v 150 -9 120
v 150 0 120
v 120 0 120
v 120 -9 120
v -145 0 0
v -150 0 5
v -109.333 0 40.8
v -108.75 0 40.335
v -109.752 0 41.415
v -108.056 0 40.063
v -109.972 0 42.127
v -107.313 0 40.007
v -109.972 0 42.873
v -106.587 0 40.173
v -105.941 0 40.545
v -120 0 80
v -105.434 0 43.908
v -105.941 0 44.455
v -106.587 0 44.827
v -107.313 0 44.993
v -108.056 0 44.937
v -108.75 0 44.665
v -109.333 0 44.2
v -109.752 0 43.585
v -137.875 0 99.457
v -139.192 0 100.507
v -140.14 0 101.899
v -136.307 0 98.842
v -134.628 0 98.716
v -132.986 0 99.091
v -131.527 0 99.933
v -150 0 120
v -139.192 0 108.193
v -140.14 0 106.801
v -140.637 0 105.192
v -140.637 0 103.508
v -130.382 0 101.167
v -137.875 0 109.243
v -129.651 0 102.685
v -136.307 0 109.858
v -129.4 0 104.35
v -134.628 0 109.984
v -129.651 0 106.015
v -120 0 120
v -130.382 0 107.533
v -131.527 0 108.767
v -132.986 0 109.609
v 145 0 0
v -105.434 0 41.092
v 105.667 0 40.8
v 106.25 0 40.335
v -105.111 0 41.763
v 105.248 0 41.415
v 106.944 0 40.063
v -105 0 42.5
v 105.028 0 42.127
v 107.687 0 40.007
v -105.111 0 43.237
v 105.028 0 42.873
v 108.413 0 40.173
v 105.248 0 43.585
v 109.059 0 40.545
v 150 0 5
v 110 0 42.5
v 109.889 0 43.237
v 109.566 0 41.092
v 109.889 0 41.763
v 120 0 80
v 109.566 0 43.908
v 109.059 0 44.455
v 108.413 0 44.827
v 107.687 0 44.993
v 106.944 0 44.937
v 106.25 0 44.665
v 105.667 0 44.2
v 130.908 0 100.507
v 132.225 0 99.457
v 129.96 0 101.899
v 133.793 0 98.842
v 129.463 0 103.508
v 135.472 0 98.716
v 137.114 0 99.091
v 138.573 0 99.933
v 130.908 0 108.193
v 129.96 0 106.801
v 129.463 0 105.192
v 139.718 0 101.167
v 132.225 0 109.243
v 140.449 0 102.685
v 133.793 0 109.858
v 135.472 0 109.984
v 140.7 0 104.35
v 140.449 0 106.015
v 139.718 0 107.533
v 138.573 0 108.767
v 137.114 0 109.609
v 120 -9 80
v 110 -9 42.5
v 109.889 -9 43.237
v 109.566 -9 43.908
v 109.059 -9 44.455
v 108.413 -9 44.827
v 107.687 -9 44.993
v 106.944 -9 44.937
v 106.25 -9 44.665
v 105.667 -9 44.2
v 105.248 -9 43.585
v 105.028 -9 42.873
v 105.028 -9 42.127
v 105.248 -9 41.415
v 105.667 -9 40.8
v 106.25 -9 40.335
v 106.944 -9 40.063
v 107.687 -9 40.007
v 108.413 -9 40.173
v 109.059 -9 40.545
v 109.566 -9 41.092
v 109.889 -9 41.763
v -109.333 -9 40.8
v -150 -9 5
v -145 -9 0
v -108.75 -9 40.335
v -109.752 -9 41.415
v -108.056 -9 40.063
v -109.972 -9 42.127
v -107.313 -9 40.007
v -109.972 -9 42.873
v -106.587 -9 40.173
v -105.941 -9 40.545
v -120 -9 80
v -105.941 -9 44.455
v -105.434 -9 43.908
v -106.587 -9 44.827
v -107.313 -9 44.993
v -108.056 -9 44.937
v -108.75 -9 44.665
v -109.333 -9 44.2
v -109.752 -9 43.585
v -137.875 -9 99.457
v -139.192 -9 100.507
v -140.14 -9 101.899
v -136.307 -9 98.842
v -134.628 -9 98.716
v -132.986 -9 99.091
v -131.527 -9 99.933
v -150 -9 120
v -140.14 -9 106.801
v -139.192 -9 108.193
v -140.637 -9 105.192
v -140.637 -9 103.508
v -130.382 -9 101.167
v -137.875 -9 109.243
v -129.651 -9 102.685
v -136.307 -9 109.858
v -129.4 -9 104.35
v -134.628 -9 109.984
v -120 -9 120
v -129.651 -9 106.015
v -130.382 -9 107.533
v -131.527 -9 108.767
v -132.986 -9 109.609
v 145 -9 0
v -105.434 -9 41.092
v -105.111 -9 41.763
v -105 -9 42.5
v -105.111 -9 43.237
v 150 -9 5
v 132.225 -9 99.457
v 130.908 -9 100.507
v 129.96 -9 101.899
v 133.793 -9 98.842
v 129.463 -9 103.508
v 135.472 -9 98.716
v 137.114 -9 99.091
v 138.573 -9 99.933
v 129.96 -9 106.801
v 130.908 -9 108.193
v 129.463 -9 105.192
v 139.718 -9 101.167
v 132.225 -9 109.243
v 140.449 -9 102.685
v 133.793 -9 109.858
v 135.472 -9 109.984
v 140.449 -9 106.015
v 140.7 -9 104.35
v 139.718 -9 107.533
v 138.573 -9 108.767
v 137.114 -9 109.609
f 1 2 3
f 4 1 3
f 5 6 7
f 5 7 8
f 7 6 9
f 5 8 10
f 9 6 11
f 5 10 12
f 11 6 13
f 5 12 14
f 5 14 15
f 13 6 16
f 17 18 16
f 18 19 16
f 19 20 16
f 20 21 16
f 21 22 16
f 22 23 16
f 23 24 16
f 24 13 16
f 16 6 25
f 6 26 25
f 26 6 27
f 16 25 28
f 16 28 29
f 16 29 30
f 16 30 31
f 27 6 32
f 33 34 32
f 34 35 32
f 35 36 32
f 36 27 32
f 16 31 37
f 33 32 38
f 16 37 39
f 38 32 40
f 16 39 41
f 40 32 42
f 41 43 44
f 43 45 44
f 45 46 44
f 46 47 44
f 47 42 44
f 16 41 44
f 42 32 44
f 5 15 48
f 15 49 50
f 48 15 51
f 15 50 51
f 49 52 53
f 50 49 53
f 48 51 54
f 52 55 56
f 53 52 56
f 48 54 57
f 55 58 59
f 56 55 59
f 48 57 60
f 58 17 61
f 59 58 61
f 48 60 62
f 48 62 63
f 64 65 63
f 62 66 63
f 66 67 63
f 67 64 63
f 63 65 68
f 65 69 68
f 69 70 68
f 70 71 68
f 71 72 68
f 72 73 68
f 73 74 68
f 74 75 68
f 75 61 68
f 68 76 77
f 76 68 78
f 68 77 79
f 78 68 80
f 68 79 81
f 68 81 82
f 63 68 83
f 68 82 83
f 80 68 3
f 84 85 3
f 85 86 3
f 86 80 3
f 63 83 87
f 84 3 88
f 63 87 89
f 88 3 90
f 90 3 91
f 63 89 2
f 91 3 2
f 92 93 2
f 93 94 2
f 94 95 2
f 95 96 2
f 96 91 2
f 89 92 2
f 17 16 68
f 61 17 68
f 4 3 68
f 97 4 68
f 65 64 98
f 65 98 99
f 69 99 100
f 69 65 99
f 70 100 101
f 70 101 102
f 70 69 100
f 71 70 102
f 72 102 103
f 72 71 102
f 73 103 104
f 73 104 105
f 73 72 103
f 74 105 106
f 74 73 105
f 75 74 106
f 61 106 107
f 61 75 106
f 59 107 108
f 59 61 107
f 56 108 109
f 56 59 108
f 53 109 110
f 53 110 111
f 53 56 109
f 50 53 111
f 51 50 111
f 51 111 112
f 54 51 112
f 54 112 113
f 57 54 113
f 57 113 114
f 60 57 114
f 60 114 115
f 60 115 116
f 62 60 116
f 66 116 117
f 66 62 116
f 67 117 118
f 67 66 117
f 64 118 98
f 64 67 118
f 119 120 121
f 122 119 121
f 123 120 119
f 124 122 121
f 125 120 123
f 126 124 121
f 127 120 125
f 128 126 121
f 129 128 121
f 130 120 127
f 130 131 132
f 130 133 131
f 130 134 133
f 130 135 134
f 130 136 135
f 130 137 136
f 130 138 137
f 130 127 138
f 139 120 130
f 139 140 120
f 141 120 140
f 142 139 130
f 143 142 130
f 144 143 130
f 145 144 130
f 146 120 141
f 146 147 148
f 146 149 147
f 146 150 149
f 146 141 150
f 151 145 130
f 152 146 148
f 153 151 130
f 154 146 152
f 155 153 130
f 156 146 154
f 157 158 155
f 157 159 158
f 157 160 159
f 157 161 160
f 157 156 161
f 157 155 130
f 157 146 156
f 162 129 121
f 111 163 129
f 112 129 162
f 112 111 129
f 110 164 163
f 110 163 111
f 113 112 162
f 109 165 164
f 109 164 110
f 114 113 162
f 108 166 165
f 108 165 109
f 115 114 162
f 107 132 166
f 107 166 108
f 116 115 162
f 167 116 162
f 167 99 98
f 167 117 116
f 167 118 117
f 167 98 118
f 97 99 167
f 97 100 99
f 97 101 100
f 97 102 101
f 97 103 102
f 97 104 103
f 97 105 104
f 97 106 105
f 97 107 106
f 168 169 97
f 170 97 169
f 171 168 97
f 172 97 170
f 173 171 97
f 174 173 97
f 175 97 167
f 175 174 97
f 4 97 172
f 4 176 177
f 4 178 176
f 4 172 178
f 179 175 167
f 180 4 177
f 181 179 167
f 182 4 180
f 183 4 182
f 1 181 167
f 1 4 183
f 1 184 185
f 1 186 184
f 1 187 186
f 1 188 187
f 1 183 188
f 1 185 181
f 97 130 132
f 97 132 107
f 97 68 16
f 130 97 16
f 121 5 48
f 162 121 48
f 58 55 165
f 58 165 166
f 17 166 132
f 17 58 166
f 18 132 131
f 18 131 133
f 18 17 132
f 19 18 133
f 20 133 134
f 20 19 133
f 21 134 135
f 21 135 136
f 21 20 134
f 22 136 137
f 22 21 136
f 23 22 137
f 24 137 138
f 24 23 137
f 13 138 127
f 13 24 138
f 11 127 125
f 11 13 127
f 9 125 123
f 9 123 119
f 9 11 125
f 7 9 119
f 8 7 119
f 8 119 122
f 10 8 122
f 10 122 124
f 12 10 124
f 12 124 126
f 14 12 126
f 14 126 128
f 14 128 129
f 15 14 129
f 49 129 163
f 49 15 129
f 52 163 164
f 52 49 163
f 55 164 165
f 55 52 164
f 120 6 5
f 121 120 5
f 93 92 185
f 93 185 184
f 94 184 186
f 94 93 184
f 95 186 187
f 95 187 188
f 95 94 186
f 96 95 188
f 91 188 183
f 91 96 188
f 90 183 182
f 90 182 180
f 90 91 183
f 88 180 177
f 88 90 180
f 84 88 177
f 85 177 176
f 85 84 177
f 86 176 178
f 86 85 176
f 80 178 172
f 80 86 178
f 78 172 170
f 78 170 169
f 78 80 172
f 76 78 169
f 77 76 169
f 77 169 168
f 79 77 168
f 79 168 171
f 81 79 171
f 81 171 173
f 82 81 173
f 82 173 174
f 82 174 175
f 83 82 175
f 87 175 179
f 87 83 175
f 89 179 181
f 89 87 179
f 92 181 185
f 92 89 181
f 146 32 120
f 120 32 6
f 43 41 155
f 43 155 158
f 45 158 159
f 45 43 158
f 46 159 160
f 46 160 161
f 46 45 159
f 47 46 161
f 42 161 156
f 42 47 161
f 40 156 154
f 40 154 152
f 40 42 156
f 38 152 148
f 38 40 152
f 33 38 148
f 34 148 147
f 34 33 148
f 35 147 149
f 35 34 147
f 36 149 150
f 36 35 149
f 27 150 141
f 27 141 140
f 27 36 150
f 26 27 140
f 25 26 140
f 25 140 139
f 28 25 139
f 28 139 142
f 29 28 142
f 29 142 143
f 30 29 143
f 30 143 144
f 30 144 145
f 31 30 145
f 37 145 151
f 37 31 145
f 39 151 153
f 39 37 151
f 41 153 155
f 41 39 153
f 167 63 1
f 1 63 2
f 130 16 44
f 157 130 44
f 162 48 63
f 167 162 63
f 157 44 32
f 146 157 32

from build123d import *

# Parameters (mm, degrees)
F0_R     = 2.5
F0_R_2   = 5.65
F1_DEPTH = 9


with BuildPart() as f1:
    # F0 (on Front) → F1 (new body)
    with BuildSketch(Plane.XZ):
        Polygon((-120, 120), (-150, 120), (-150, 5), (-145, 0), (0, 0), (145, 0), (150, 5), (150, 120), (120, 120), (120, 80), (0, 80), (-120, 80), align=None)
        with Locations((-107.5, 42.5)):
            Circle(F0_R, mode=Mode.SUBTRACT)
        with Locations((107.5, 42.5)):
            Circle(F0_R, mode=Mode.SUBTRACT)
        with Locations((-135.05, 104.35)):
            Circle(F0_R_2, mode=Mode.SUBTRACT)
        with Locations((135.05, 104.35)):
            Circle(F0_R_2, mode=Mode.SUBTRACT)
    extrude(amount=F1_DEPTH)


solid = f1.part
